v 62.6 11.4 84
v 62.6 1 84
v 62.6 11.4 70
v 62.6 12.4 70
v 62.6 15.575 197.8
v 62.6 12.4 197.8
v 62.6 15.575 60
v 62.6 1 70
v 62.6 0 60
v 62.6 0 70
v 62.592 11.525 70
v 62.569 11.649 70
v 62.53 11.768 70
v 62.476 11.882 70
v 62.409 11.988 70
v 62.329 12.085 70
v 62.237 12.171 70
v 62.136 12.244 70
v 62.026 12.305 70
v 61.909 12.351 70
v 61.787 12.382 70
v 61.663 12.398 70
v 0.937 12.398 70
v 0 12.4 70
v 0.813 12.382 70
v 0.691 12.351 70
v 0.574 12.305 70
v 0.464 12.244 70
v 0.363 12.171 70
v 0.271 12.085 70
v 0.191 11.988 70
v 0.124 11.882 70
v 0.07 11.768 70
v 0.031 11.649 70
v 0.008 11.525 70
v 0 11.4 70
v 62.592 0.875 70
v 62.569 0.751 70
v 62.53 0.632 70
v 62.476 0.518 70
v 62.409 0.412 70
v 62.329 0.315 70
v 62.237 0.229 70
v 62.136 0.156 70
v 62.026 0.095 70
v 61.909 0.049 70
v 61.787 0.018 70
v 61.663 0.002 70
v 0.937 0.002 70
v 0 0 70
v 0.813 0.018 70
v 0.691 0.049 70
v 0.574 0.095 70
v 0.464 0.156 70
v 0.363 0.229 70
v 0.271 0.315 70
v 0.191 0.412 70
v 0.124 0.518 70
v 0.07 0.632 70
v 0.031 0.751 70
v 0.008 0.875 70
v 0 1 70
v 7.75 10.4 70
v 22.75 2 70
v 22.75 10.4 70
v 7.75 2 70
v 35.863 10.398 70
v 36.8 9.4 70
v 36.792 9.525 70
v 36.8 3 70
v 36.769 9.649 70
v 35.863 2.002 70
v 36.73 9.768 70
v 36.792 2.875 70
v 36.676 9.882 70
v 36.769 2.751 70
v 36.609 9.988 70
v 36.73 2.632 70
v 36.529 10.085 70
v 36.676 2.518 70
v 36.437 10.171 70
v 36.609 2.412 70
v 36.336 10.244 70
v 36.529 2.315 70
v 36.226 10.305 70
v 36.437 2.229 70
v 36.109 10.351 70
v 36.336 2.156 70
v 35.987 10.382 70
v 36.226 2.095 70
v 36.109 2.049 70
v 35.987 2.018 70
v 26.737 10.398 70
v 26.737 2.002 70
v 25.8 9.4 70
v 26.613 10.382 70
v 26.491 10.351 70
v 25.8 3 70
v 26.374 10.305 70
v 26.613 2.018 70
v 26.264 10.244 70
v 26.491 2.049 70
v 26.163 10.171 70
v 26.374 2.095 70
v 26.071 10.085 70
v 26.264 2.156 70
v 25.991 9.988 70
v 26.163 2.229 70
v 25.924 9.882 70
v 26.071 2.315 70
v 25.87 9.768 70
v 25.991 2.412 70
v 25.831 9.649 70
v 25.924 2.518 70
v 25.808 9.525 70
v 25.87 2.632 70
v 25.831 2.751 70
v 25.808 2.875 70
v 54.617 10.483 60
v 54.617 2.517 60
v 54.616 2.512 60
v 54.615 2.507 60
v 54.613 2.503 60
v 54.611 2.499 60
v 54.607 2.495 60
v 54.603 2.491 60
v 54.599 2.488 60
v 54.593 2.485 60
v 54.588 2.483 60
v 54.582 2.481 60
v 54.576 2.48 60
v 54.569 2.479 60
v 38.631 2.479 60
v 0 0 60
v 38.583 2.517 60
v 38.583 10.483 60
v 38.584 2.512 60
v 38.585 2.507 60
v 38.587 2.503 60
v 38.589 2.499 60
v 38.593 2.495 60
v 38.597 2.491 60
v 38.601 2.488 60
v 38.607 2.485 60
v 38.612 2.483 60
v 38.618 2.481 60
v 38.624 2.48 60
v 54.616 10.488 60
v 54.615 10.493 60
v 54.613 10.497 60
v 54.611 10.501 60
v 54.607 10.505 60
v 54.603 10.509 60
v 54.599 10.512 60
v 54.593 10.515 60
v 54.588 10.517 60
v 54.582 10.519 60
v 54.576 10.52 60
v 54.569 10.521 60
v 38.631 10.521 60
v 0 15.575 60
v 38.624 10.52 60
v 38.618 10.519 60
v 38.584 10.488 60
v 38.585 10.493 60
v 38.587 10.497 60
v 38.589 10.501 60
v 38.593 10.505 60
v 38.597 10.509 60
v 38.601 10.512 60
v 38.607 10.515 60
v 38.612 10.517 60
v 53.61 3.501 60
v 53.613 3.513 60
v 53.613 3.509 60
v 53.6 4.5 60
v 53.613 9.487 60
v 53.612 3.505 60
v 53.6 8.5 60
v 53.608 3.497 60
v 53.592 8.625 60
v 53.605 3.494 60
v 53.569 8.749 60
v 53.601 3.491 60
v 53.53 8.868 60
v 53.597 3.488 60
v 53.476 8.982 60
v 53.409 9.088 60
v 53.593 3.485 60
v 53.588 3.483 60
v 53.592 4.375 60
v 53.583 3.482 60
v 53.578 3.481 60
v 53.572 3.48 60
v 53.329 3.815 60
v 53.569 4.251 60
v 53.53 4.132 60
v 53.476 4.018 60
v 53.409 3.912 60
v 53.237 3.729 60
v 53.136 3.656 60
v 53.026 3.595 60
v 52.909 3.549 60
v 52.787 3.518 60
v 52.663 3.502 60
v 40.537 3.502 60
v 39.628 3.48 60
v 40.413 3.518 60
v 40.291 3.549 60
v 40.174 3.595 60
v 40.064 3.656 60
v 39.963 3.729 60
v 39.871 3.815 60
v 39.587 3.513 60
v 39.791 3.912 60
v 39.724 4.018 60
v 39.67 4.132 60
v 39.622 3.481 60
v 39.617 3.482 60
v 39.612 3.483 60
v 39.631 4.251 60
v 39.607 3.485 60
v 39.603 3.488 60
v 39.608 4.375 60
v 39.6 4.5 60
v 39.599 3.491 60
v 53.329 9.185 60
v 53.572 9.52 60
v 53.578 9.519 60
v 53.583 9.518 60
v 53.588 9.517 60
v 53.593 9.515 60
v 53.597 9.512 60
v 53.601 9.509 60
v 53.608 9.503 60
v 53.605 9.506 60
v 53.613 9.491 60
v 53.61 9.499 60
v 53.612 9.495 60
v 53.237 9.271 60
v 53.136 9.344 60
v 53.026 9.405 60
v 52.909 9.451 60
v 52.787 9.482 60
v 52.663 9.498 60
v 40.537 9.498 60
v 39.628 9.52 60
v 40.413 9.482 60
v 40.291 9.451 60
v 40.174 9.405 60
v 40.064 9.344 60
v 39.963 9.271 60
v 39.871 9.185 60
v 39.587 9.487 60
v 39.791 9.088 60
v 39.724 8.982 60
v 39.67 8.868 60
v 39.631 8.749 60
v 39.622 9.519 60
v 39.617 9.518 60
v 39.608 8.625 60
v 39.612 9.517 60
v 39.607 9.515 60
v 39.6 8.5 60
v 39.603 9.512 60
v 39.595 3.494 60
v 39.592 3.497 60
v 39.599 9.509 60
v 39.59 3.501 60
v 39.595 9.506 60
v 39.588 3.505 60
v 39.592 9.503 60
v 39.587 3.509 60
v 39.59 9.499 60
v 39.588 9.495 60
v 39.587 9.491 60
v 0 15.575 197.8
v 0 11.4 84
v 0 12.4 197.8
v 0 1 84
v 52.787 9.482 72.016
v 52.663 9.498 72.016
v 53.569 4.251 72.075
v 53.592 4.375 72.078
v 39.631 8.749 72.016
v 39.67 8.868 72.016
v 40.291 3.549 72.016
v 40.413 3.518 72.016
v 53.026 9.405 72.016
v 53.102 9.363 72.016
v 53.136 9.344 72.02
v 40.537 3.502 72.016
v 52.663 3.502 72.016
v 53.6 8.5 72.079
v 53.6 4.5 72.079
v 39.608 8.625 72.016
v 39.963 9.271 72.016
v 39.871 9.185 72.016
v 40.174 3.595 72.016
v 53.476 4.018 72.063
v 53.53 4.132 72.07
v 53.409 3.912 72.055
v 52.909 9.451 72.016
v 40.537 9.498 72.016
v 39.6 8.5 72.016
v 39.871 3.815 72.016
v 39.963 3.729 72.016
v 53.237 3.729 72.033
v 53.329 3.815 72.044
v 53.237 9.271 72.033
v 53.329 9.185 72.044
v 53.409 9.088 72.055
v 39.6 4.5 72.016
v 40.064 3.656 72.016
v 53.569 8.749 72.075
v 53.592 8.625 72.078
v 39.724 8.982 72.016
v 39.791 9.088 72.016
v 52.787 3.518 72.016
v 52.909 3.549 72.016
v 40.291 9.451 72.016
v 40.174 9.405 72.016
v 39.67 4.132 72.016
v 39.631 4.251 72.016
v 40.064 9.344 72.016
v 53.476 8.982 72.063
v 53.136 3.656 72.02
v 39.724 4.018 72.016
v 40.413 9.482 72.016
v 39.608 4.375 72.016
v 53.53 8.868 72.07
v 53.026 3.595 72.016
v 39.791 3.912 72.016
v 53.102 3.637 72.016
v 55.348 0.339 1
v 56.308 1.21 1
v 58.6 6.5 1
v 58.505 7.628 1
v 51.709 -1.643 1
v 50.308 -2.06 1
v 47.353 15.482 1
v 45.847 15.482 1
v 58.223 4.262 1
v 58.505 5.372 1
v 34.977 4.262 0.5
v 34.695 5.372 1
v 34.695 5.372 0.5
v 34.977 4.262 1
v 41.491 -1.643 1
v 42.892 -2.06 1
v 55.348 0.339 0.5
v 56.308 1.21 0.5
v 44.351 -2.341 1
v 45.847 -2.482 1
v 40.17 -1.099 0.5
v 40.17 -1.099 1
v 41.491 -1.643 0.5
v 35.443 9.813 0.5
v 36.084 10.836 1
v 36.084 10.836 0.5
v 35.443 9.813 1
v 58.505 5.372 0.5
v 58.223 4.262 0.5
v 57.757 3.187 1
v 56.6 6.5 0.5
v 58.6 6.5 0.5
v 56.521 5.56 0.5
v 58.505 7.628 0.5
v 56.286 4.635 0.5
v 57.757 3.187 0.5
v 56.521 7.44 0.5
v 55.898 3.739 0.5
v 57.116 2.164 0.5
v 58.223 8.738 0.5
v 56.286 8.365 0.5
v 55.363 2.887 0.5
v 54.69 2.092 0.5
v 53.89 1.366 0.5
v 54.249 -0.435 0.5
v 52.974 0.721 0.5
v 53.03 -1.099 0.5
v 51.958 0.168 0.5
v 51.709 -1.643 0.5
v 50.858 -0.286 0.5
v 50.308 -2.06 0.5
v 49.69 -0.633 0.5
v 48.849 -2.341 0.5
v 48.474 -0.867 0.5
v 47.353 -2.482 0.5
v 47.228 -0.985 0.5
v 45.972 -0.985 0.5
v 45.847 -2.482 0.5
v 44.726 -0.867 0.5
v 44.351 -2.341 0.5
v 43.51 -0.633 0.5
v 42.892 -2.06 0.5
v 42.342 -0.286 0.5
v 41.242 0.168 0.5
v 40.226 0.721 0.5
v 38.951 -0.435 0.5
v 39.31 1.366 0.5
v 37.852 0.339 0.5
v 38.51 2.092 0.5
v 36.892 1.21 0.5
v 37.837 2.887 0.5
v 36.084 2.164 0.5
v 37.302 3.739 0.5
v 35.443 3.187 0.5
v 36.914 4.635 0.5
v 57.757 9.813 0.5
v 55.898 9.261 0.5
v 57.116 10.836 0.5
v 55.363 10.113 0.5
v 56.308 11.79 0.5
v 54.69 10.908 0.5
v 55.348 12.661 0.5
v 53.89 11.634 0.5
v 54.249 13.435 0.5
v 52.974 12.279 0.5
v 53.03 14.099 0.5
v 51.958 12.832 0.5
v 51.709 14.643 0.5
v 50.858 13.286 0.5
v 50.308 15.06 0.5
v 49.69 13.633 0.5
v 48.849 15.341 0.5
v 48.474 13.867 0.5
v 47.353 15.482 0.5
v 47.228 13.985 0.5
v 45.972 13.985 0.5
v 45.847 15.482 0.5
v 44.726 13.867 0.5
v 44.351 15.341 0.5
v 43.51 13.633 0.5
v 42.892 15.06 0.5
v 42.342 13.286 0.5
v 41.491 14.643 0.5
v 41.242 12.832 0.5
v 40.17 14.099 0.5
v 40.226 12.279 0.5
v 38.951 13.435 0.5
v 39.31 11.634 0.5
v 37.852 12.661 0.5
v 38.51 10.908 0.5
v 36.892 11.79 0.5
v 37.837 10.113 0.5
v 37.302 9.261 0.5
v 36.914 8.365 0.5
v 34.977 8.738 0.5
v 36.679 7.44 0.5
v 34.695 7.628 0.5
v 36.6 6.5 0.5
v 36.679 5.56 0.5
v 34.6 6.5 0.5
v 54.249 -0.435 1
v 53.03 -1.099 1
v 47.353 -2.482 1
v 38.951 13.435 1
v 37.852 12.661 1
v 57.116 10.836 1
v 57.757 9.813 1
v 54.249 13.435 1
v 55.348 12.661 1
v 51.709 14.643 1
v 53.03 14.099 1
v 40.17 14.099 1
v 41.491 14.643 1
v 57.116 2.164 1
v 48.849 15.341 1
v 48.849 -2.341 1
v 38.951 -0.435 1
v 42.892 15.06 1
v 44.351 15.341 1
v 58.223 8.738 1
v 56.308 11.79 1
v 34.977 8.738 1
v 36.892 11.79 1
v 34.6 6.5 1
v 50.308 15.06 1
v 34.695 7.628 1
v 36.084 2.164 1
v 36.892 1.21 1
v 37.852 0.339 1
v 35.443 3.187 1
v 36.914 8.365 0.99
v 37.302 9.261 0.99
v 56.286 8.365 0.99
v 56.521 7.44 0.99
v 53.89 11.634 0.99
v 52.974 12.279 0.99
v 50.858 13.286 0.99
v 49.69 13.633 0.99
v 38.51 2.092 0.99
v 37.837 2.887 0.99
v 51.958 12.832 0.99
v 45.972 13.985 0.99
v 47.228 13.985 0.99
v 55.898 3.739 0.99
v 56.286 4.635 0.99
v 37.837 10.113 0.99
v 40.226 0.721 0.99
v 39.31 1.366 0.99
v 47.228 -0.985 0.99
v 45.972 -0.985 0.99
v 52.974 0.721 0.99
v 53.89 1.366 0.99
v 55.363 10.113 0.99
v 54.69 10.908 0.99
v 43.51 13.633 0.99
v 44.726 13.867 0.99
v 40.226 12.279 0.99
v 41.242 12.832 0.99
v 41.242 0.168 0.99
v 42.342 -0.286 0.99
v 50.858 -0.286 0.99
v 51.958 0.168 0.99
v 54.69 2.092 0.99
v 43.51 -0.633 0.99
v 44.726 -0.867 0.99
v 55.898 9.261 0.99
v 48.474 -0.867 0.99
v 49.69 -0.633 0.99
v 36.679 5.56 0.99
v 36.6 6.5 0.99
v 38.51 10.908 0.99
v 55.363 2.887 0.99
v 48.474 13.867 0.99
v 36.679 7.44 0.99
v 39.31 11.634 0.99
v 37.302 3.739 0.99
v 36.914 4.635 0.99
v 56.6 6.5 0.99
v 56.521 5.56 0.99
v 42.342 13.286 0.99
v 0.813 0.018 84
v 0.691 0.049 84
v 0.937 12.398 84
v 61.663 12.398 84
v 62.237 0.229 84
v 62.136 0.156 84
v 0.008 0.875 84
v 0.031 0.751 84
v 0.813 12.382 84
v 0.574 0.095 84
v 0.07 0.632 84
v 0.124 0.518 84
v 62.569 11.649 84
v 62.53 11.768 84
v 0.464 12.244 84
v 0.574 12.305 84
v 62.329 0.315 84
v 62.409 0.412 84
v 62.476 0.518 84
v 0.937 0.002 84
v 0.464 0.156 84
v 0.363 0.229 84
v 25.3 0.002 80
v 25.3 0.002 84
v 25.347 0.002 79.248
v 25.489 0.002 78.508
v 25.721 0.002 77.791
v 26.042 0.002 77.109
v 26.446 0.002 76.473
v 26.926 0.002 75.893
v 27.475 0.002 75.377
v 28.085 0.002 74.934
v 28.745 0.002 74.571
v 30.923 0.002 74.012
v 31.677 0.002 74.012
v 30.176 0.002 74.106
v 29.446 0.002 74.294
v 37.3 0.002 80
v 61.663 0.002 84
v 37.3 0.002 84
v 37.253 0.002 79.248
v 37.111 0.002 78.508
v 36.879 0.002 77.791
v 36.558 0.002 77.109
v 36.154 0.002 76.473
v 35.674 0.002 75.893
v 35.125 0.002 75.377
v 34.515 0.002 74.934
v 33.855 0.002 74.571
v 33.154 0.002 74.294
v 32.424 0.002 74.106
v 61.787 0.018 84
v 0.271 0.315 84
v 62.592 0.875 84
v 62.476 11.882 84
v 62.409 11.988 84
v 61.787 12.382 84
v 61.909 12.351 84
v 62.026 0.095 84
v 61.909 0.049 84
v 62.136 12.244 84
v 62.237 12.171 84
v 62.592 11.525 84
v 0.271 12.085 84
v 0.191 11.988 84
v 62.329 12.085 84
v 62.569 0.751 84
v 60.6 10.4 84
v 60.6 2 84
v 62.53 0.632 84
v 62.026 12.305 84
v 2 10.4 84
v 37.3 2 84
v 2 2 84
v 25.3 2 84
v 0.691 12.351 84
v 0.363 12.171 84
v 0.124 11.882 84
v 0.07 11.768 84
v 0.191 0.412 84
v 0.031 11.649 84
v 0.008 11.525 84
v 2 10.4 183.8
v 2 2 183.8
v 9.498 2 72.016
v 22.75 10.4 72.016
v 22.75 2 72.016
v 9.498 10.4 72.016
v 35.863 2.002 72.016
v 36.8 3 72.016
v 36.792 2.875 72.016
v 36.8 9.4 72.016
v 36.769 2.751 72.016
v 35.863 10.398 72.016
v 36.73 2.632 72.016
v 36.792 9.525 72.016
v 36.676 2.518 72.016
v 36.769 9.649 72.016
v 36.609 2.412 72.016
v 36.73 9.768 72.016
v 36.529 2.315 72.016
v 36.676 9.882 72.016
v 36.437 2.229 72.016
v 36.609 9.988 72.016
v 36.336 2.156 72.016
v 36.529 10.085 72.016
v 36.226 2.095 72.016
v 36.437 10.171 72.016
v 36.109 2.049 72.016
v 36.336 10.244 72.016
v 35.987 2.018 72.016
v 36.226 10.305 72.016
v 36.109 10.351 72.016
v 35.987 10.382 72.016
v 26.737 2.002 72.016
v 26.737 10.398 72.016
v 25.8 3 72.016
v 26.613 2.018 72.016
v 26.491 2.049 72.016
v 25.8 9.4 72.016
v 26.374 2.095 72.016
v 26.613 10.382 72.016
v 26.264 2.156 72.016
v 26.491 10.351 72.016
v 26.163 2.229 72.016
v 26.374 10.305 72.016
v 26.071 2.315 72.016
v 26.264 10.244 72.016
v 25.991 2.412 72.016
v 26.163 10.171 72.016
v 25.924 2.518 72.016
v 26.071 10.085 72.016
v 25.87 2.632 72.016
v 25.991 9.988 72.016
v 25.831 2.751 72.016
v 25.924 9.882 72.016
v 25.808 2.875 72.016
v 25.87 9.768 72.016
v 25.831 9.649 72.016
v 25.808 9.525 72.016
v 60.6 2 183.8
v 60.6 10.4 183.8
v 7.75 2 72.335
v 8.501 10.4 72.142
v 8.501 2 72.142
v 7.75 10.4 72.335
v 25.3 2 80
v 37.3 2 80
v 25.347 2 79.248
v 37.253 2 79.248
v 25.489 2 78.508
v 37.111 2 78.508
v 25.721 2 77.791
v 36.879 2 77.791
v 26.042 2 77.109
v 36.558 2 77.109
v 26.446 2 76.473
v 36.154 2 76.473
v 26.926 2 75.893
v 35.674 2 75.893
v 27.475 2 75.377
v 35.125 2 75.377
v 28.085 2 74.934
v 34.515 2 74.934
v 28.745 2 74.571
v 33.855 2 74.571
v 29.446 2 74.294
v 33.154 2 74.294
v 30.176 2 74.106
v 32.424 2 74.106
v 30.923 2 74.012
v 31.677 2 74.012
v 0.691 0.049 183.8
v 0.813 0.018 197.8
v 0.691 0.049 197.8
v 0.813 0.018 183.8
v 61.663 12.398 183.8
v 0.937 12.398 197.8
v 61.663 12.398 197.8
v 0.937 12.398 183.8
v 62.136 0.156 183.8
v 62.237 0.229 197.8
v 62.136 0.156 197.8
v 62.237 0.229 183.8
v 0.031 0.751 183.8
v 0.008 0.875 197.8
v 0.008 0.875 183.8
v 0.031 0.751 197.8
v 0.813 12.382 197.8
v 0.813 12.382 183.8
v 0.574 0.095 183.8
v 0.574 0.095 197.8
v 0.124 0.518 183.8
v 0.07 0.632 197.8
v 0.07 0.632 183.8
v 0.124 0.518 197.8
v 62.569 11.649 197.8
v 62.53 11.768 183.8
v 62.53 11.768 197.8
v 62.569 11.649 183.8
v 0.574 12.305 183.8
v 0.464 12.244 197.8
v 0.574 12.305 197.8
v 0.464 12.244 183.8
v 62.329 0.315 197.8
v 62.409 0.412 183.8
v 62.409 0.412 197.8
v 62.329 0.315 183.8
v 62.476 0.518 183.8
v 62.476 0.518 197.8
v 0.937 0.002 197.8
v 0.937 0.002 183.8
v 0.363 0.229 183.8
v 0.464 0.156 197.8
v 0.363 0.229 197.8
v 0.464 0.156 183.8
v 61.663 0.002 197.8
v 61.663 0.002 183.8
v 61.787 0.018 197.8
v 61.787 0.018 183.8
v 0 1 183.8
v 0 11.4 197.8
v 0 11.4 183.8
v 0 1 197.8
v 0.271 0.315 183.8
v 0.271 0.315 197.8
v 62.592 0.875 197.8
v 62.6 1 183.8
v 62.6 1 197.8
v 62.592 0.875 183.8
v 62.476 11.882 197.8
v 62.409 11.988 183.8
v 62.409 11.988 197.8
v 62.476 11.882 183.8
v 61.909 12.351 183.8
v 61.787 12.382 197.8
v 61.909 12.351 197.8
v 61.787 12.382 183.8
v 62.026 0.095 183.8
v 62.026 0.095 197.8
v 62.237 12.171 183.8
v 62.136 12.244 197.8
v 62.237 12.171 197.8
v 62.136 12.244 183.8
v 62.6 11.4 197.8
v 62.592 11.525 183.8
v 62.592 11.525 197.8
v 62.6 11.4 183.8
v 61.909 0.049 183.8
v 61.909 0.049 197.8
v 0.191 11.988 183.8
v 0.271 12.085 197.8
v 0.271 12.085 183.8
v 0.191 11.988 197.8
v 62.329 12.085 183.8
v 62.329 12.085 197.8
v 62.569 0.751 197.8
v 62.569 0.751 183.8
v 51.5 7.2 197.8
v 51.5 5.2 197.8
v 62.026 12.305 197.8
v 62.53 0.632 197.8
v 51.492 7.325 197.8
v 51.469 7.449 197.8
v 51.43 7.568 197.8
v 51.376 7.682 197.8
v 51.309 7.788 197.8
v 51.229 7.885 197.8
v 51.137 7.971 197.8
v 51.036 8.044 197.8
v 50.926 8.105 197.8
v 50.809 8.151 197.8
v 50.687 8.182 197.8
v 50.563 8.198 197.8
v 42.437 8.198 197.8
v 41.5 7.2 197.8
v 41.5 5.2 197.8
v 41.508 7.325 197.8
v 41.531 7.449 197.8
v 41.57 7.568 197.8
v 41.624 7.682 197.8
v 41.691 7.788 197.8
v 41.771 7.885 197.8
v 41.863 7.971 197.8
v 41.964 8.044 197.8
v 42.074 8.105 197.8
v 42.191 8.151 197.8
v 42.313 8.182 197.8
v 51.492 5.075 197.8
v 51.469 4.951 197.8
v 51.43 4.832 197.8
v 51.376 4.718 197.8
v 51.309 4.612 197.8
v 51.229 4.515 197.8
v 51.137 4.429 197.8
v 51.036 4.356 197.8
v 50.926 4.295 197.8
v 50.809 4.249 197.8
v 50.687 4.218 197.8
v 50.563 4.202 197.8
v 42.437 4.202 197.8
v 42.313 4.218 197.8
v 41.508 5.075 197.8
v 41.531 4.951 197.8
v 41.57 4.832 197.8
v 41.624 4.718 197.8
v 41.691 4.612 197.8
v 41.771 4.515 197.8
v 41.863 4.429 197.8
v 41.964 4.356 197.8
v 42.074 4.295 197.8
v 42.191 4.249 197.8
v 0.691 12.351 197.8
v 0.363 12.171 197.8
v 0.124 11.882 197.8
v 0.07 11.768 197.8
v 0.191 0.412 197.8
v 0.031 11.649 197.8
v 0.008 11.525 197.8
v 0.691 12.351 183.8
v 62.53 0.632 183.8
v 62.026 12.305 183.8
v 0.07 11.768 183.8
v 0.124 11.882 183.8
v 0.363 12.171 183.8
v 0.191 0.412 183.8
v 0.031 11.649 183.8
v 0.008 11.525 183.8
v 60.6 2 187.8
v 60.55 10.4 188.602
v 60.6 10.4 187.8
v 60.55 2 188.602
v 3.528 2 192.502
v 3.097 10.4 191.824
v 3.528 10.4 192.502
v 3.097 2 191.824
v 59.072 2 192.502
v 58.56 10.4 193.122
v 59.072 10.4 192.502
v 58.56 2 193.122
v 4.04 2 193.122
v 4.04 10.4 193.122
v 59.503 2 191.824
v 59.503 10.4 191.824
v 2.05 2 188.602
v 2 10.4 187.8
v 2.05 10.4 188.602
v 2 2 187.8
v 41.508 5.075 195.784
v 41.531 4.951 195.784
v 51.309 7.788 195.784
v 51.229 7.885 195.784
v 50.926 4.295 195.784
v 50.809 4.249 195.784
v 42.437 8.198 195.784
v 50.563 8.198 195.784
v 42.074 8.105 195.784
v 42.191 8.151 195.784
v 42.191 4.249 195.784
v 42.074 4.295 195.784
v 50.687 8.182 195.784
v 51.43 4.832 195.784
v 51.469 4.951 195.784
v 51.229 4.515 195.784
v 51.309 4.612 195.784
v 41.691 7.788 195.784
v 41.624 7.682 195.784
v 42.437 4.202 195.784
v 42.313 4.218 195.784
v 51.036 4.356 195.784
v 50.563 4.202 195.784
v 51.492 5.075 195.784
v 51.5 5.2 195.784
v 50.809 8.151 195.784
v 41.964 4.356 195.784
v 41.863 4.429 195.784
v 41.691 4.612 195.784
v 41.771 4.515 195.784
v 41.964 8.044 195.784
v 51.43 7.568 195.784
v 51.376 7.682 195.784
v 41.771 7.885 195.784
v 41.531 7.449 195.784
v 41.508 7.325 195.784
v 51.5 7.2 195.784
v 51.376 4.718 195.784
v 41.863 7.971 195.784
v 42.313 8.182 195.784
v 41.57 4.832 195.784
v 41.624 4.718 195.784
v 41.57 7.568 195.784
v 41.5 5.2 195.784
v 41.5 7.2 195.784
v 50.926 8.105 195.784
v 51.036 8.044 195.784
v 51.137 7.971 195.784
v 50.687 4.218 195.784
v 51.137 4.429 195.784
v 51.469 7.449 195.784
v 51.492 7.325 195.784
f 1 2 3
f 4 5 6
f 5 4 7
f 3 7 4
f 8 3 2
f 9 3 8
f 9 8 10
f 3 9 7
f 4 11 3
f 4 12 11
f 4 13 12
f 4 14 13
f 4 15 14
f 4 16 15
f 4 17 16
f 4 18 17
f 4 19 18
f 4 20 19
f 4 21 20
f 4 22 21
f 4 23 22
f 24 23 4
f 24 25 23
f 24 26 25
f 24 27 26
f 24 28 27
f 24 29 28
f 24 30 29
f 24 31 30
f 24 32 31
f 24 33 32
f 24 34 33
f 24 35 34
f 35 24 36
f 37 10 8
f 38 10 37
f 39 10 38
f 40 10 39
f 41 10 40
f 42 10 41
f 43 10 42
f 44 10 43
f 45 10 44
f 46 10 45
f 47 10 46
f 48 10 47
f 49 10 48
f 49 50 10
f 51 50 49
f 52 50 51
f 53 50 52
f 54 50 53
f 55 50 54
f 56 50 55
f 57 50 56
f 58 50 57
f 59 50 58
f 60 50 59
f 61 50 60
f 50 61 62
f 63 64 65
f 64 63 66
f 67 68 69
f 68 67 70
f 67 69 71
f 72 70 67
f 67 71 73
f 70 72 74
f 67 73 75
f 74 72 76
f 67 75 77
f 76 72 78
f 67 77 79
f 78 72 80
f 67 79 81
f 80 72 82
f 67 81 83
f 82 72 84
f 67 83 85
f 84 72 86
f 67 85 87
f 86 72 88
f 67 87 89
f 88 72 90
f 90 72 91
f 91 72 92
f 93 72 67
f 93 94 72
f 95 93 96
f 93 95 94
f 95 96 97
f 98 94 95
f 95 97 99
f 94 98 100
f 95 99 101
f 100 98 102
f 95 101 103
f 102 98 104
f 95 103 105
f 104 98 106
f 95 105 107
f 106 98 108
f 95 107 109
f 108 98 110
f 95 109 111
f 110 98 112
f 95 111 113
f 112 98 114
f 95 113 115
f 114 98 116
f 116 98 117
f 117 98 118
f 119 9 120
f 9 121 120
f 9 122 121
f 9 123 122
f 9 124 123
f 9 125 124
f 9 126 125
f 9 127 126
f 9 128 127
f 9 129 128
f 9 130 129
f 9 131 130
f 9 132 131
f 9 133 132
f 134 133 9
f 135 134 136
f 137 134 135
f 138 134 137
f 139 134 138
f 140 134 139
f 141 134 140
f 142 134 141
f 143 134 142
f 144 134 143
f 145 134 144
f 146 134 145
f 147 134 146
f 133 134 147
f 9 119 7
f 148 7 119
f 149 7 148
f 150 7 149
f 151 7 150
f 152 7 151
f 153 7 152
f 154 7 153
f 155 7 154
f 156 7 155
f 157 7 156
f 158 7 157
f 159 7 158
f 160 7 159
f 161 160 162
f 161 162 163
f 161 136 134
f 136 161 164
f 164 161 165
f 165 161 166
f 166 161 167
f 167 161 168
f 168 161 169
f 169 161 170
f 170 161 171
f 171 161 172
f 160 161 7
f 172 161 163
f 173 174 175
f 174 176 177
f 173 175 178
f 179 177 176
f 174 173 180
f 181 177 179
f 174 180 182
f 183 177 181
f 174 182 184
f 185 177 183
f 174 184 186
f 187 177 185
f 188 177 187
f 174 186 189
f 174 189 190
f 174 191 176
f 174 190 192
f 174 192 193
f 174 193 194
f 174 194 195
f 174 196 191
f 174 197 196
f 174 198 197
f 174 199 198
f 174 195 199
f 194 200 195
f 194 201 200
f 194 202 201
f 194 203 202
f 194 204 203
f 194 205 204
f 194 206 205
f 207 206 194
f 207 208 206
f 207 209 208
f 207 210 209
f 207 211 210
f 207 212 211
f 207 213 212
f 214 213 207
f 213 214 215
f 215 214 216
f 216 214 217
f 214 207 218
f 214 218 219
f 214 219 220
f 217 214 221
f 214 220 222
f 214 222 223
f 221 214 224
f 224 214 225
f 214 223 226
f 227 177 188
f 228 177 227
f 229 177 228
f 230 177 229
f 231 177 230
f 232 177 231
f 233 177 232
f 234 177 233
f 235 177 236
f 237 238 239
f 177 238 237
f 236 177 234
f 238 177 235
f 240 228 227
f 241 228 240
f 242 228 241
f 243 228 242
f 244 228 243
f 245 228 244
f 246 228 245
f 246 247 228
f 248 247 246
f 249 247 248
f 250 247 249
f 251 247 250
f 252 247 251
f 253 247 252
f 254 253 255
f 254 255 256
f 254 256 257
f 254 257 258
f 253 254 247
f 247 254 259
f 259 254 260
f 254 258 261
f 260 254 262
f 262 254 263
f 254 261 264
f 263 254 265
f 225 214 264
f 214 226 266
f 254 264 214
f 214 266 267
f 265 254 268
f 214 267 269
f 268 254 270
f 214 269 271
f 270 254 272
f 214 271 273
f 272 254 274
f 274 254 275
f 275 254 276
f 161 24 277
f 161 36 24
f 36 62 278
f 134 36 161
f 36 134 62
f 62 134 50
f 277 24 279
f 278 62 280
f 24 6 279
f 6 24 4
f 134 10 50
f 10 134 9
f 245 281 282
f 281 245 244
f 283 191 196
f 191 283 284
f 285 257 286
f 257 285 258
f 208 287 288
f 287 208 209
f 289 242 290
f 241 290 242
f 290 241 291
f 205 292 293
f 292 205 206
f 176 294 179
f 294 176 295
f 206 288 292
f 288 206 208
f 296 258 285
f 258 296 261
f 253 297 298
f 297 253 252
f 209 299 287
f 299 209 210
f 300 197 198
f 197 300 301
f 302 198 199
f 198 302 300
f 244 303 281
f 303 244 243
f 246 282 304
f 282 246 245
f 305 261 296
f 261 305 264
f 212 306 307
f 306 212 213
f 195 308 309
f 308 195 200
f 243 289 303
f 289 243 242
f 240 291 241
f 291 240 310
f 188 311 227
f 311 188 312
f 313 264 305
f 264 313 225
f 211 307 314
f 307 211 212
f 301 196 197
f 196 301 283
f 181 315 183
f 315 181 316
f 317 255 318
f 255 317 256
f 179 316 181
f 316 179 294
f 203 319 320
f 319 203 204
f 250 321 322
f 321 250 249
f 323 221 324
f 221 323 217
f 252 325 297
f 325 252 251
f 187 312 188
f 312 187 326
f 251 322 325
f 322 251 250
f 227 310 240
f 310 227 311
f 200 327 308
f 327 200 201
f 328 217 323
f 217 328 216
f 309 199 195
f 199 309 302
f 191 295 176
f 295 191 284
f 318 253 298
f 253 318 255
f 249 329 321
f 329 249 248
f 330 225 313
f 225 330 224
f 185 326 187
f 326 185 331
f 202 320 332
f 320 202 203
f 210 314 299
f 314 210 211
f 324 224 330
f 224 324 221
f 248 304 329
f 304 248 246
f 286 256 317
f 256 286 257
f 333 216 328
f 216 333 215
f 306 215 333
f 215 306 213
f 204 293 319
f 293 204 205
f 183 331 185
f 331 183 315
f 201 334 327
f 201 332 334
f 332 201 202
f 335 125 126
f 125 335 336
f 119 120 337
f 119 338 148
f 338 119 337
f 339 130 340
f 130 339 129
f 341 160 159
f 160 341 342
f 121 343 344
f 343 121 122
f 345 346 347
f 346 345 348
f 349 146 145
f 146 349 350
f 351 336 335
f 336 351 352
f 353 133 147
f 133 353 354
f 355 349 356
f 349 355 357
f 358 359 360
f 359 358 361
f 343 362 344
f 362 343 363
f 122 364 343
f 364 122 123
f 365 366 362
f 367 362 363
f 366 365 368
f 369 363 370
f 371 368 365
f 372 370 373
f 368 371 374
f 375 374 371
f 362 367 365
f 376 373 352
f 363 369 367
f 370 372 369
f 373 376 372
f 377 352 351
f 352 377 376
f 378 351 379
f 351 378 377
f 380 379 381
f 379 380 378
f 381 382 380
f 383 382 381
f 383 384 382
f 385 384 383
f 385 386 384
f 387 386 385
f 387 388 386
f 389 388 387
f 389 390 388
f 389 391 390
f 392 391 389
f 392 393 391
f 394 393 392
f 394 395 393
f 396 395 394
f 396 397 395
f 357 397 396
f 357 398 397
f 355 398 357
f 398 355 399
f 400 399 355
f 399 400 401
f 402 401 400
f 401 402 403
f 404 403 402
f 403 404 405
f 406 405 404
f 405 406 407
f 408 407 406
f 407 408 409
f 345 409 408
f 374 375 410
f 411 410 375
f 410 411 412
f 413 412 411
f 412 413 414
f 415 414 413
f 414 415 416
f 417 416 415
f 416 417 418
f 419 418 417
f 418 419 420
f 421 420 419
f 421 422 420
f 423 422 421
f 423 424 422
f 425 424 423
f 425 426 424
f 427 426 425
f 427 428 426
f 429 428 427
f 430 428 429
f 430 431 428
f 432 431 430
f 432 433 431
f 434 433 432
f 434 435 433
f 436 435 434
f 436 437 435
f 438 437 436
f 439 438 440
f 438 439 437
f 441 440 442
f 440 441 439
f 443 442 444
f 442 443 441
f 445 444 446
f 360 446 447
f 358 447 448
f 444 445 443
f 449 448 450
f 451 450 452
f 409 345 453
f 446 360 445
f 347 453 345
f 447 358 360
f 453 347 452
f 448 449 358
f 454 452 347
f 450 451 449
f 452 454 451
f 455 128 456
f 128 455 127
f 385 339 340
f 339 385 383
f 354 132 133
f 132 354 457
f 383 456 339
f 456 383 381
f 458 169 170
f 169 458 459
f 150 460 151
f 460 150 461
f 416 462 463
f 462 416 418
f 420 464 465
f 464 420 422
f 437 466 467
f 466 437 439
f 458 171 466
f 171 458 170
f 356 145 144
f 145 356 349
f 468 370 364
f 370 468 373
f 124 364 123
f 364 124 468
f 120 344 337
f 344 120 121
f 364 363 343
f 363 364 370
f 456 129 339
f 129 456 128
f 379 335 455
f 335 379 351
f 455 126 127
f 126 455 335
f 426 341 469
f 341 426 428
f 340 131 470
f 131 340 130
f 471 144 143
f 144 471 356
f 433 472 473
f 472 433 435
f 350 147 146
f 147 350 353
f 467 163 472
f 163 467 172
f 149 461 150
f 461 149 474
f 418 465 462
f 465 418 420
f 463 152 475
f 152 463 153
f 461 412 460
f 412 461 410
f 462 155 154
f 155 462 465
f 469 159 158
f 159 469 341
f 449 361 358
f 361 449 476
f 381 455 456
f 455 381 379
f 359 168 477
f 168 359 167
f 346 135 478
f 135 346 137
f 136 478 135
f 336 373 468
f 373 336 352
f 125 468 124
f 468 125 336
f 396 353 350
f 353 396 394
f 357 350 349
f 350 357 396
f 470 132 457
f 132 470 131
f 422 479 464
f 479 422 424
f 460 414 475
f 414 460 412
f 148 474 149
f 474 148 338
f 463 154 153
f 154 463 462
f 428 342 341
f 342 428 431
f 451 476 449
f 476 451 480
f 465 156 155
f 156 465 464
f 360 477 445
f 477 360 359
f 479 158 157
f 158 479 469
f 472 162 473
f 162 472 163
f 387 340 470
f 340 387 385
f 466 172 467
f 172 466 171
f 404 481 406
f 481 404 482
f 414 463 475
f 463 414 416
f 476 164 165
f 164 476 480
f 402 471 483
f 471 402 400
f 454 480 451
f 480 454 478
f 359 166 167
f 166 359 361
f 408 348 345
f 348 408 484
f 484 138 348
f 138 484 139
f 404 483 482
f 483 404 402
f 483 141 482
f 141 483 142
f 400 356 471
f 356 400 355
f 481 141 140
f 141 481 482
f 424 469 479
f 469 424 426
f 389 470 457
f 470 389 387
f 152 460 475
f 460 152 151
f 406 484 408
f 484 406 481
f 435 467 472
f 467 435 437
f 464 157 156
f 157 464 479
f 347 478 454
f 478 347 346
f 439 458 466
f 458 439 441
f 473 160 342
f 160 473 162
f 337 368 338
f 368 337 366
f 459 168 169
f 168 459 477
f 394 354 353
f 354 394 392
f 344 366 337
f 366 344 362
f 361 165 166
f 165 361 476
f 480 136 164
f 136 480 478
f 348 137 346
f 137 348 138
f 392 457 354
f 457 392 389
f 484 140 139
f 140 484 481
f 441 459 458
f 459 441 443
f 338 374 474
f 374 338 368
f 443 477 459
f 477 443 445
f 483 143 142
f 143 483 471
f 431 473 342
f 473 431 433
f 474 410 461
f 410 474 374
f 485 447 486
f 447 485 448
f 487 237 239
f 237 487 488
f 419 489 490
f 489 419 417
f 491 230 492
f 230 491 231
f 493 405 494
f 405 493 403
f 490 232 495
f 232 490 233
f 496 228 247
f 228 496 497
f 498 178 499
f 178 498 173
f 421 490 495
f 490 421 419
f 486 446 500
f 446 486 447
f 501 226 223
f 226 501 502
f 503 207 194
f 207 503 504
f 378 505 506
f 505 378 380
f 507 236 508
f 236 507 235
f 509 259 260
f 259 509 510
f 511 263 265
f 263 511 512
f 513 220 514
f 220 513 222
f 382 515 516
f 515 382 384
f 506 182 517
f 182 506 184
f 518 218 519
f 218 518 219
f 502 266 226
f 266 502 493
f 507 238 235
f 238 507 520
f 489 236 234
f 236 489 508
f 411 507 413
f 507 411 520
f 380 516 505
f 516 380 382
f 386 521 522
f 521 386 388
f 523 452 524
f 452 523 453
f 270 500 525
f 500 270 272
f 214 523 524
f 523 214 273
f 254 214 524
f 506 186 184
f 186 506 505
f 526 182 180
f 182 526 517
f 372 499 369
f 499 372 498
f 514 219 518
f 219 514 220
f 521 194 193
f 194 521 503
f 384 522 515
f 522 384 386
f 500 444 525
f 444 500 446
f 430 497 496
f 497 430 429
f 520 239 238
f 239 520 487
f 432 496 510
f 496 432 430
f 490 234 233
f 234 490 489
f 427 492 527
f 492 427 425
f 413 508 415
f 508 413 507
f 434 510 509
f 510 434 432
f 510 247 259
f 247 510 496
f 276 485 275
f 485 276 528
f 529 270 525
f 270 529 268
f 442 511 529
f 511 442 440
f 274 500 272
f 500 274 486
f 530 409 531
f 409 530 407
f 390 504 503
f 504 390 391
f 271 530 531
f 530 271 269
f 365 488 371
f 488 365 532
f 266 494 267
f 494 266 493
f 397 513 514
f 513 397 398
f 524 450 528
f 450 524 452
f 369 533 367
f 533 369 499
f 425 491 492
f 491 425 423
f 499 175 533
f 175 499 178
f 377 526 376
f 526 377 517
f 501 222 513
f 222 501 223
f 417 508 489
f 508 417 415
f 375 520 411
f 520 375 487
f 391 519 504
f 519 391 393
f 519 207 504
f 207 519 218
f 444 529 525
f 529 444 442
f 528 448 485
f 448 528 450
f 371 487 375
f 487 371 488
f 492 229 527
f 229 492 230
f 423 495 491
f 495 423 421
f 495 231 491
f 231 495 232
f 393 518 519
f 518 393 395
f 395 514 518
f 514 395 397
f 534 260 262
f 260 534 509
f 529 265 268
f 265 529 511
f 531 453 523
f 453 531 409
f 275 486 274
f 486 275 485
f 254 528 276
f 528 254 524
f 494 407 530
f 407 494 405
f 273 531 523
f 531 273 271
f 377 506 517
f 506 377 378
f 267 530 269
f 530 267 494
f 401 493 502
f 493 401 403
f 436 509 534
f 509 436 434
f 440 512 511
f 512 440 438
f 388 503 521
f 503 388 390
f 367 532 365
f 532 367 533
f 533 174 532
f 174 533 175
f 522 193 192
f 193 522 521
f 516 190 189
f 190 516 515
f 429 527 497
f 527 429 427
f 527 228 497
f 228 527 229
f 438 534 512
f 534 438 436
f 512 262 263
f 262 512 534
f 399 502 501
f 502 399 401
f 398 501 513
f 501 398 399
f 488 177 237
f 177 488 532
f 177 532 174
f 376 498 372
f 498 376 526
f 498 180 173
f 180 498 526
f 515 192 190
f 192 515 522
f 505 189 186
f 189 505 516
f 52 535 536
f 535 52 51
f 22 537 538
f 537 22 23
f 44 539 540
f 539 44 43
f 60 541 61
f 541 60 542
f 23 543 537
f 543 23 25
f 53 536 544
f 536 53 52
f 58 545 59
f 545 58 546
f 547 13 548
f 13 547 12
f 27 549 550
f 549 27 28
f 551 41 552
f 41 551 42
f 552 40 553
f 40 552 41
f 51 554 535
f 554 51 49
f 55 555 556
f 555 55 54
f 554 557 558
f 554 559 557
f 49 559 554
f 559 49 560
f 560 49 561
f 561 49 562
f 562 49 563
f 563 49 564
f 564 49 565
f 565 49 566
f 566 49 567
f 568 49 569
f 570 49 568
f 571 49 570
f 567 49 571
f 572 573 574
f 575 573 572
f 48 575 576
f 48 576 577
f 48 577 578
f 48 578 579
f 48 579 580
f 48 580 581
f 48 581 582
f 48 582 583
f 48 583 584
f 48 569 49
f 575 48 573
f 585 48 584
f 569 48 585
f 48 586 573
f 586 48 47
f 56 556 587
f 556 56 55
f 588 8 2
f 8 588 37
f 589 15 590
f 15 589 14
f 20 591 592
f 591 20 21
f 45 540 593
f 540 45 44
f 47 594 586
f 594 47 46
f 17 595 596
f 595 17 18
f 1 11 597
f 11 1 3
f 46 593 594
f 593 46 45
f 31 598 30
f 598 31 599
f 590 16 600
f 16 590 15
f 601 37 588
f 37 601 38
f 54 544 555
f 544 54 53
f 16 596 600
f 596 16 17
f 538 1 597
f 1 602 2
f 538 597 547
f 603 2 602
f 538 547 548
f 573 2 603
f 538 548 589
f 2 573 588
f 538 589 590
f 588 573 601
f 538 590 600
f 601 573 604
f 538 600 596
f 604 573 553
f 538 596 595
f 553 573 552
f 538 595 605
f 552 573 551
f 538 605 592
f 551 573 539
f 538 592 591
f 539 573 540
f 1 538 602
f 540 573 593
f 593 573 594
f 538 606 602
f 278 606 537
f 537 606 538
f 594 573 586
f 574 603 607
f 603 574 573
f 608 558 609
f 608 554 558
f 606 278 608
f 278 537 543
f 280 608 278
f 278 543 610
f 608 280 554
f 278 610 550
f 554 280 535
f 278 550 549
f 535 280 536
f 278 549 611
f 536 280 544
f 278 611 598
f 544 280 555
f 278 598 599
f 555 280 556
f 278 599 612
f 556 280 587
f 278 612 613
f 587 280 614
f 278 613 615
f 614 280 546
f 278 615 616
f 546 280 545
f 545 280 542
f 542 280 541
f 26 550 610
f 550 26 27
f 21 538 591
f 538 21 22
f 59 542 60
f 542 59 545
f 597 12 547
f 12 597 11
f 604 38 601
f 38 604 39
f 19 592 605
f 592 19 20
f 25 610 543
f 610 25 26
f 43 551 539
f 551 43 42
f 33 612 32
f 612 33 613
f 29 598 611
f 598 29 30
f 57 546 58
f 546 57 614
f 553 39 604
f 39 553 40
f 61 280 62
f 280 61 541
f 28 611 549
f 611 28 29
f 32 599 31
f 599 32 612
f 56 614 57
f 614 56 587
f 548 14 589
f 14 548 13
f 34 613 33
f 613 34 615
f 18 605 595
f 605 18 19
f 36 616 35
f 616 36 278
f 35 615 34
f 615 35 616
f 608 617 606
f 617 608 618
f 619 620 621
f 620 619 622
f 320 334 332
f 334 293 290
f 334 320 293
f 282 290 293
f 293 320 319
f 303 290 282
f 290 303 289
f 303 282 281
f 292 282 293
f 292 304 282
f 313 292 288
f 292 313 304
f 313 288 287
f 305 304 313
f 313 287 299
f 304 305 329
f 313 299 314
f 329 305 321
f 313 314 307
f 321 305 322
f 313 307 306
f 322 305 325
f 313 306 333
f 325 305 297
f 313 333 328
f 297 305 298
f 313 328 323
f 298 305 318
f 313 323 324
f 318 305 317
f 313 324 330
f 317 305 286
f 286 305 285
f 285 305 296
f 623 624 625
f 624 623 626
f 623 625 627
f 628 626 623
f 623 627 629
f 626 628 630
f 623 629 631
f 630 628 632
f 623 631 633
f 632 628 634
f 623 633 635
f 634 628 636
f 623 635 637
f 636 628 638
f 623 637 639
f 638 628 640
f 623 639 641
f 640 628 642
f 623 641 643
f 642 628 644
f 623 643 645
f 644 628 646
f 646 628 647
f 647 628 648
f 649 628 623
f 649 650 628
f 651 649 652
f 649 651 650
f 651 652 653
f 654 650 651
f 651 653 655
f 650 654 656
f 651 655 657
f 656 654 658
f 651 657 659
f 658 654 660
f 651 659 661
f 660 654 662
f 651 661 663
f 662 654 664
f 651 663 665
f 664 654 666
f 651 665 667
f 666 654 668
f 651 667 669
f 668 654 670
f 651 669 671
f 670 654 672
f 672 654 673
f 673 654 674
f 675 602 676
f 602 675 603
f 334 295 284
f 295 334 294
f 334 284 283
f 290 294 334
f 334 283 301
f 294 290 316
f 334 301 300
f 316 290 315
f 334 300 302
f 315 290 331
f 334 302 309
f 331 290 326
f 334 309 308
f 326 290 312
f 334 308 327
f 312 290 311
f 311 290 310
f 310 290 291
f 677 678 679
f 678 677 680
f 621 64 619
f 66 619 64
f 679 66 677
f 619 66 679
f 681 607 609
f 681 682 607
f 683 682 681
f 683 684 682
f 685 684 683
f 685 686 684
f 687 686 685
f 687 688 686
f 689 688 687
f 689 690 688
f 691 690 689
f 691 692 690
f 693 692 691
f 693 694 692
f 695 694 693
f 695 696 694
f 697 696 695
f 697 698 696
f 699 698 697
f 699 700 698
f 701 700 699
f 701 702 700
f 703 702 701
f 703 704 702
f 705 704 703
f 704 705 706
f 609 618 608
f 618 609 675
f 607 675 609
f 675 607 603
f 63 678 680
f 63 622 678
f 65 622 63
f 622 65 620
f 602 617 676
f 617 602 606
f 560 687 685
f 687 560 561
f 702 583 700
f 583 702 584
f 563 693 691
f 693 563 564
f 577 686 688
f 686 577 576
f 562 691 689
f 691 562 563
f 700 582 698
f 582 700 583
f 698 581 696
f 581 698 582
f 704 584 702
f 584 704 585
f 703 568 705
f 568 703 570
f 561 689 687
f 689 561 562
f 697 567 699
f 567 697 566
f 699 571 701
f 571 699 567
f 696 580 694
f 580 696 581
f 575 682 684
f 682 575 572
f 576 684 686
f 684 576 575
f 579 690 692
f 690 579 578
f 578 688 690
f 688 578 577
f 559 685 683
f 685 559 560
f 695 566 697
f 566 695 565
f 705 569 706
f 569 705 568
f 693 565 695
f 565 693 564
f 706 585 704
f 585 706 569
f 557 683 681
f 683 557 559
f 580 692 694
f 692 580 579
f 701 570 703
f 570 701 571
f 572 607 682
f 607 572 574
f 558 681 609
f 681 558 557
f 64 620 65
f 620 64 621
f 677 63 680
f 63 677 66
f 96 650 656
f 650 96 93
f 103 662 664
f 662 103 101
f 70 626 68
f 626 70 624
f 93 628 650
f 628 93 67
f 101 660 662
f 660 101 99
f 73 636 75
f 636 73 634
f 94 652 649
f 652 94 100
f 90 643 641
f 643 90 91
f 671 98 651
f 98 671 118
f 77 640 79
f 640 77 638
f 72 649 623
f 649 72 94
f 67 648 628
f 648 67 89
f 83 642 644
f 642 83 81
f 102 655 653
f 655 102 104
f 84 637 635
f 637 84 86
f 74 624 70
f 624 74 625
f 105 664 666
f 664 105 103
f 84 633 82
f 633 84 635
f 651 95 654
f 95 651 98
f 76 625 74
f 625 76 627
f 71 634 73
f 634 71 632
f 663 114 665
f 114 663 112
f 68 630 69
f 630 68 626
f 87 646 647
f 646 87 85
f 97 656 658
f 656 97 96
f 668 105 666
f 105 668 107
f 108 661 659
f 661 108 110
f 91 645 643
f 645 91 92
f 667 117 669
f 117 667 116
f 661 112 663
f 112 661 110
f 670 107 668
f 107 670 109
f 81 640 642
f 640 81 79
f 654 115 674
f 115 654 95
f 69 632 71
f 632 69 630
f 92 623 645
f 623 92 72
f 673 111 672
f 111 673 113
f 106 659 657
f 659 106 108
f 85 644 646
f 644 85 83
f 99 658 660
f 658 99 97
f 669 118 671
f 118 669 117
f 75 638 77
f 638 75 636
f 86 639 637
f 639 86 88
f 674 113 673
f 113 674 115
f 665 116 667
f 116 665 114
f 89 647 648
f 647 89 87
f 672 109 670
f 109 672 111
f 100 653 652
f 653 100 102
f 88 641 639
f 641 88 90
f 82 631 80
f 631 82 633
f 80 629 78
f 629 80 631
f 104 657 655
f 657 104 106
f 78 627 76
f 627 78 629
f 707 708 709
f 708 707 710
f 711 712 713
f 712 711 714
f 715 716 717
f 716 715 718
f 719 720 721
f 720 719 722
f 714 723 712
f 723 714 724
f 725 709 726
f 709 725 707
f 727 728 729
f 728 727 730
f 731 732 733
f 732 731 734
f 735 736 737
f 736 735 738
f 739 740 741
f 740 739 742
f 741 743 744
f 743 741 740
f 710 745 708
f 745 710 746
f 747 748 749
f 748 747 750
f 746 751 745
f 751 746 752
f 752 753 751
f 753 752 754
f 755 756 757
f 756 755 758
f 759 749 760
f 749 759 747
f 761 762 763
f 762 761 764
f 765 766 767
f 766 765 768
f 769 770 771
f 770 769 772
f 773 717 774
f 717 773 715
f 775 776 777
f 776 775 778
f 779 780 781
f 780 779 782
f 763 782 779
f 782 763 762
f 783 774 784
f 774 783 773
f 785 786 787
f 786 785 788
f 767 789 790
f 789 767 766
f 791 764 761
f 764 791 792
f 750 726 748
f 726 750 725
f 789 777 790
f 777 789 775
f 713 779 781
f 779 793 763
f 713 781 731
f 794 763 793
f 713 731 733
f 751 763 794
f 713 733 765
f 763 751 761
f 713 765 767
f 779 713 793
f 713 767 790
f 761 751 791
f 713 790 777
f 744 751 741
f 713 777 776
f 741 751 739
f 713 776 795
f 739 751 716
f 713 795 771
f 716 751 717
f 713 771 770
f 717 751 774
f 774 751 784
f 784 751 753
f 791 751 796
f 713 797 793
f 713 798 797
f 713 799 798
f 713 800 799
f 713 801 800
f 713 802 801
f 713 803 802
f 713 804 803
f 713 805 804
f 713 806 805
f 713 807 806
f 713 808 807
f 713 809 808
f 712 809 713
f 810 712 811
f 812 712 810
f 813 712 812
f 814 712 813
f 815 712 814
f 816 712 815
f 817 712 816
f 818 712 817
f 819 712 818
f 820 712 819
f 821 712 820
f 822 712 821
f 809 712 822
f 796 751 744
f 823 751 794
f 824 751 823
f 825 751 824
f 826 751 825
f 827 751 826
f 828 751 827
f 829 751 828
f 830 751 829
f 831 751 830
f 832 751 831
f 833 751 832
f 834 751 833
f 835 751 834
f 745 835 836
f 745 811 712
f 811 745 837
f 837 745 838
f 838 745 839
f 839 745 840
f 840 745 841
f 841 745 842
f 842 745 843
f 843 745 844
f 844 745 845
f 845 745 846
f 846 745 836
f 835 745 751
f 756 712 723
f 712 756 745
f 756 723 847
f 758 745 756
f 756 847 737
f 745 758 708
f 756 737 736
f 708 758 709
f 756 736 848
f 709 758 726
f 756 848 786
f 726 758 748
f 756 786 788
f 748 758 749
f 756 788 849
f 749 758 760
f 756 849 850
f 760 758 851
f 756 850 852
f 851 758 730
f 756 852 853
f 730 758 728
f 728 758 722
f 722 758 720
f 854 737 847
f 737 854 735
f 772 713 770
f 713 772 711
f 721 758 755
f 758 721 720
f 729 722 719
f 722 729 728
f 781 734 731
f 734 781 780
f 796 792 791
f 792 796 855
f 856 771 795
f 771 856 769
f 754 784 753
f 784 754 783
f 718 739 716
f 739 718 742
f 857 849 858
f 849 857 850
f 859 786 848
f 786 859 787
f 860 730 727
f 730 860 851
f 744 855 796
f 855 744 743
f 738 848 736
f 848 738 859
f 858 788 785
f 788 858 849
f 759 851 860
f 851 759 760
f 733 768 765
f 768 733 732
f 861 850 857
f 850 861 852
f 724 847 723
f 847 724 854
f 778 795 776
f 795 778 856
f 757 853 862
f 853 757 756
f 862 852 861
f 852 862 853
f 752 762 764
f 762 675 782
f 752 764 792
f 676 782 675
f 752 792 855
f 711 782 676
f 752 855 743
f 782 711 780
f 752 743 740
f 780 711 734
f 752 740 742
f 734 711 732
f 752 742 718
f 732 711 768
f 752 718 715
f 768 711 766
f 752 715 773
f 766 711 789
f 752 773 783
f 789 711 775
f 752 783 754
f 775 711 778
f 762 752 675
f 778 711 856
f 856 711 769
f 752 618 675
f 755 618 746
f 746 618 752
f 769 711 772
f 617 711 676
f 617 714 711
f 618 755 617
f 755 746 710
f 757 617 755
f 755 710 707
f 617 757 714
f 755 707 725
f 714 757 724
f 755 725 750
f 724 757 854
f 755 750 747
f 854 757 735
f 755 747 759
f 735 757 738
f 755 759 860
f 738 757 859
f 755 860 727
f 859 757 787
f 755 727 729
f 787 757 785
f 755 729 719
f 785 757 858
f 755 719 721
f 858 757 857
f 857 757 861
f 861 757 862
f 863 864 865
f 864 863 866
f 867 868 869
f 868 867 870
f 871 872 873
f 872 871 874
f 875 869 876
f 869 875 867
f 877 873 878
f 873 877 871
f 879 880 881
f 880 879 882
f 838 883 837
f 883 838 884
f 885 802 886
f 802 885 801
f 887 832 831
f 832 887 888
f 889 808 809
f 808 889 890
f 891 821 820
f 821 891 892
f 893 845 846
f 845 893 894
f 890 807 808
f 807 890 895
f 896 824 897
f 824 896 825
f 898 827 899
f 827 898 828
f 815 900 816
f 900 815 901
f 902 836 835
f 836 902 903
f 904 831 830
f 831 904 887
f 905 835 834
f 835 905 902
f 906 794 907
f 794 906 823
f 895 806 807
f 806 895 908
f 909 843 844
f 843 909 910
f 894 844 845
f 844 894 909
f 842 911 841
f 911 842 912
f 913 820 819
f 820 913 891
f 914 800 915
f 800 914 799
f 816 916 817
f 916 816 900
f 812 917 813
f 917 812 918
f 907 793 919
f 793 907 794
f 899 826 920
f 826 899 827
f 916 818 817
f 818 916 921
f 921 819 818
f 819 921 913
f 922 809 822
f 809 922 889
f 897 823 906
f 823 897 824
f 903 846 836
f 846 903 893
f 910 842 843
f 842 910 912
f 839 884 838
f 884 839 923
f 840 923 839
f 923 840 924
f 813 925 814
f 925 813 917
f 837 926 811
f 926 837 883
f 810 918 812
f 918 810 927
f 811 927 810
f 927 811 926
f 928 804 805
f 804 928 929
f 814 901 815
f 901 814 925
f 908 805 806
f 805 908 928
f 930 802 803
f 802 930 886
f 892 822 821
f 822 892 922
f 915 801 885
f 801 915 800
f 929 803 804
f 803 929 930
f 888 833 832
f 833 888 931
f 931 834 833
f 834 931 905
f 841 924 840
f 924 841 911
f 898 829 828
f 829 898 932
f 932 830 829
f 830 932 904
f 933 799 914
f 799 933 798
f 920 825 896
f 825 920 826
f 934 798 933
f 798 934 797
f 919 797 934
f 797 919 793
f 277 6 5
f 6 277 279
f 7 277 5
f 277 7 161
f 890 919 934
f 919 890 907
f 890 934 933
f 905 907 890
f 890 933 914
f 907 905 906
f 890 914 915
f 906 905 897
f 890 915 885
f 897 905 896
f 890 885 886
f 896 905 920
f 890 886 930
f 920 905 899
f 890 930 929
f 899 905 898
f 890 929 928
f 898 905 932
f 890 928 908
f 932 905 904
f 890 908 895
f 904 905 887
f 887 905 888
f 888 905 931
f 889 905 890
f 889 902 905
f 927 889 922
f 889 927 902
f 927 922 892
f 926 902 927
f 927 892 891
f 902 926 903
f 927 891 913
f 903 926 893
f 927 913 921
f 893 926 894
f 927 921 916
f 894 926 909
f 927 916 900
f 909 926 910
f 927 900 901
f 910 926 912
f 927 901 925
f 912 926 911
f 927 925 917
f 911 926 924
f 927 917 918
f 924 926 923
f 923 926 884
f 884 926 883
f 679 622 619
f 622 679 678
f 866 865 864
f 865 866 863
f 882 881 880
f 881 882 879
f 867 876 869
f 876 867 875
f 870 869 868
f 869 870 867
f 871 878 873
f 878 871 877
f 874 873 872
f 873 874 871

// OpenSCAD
// file: ../lib/basics.scad
// ## `basics.scad`
// This library contains basic elements to construct mobile device augmentations.

// ### `roundedCube(dimension,edgeRadius)`
// A cube with rounded edges on the depth axis. This function is helpful for creating simple phone shapes.
// #### Where
// * `dimension=[width,depth,height]`: the size of the cube
// * `edgeRadius`: the radius of the rounded edges 
module roundedCube(dimension=[10,10,10],edgeRadius=1){
    translate([0,dimension[1],0])
		rotate([90,0,0])
			hull(){
        		translate([edgeRadius,edgeRadius,0])
					cylinder(r=edgeRadius,h=dimension[1]);
        		translate([dimension[0]-edgeRadius,edgeRadius,0])
					cylinder(r=edgeRadius,h=dimension[1]);
        		translate([edgeRadius,dimension[2]-edgeRadius,0])
					cylinder(r=edgeRadius,h=dimension[1]);
        		translate([dimension[0]-edgeRadius,dimension[2]-edgeRadius,0])
					cylinder(r=edgeRadius,h=dimension[1]);
    		}
}

// ### `bottomHolder(deviceWidth,deviceDepth,deviceEdgeRadius,deviceHeightInHolder,wallThickness,holderEdgeRadius)`
// A basic generic element to hold the bottom part of a device
// #### Where
// * `deviceWidth`: the width of the device to be held
// * `deviceDepth`: the depth of the device to be held
// * `deviceEdgeRadius`: the edge radius of the device to be held
// * `deviceHeightInHolder`: the height of the part of the holder covering the device
// * `wallThickness`: the holder's wall thickness
// * `holderEdgeRadius`: the holder's edge radius
module bottomHolder(deviceWidth=10,deviceDepth=10,deviceEdgeRadius=1,
deviceHeightInHolder=10,wallThickness=1,holderEdgeRadius=1){
	difference(){
		translate([0,deviceDepth+wallThickness*2,0])
			rotate([90,0,0])
				roundedCube([deviceWidth+wallThickness*2,deviceHeightInHolder+wallThickness,
				deviceDepth+wallThickness*2],holderEdgeRadius);
		translate([wallThickness,wallThickness,wallThickness])
			roundedCube([deviceWidth,deviceDepth,
			deviceHeightInHolder+deviceEdgeRadius],deviceEdgeRadius);
	}
}

// ### `topHolder(deviceWidth,deviceDepth,deviceEdgeRadius,deviceHeightInHolder,wallThickness,lipsWidth,holderEdgeRadius)`
// A basic generic element to hold the top part of a device
// #### Where
// * `deviceWidth`: the width of the device to be held
// * `deviceDepth`: the depth of the device to be held
// * `deviceEdgeRadius`: the edge radius of the device to be held
// * `deviceHeightInHolder`: the height of the part of the holder covering the device
// * `wallThickness`: the holder's wall thickness
// * `lipsWidth`: size of the lips holding the device
// * `holderEdgeRadius`: the holder's edge radius
module topHolder(deviceWidth=10,deviceDepth=10,deviceEdgeRadius=1,deviceHeightInHolder=10,
wallThickness=1,lipsWidth=2,holderEdgeRadius=1){
	difference(){
		translate([0,deviceDepth+wallThickness*2,0])rotate([90,0,0])
			roundedCube([deviceWidth+wallThickness*2,deviceHeightInHolder+wallThickness,
			deviceDepth+wallThickness*2],holderEdgeRadius);
		translate([wallThickness,wallThickness,-wallThickness*2])
			roundedCube([deviceWidth,deviceDepth,deviceHeightInHolder],deviceEdgeRadius);
		//translate([wallThickness+lipsWidth,-0.01,-wallThickness-lipsWidth-0.85]) // TODO: 0.85 wrong here: needs to be fixed
		//	roundedCube([deviceWidth-lipsWidth*2,wallThickness+0.02,deviceHeightInHolder],
	//		deviceEdgeRadius*((deviceWidth-lipsWidth*2)/deviceWidth));
	}
}

// ### `rectangleCircularHorn(rectangleWidth,rectangleHeight,circleRadius,hornLength,wallThickness,hornDeformationFactor,hornDerivation,endsHeight)`
// A horn with a square termination on one side and a circle termination on the other.
// #### Where
// * `rectangleWidth`: the width of the rectangular termination
// * `rectangleHeight`: the height of the rectangular termination
// * `circleRadius`: the radius of the circular termination
// * `hornLength`: the length of the horn
// * `wallThickness`: the thickness of the walls
// * `hornDeformationFactor`: controls the vertical flatness of the horn with (1=perfect circle, >1=flatened circle) 
// * `hornDerivation`: displace the position of the circular end relatively to the rectangular end on the horizontal axis
// * `endsHeight`: the height of the two ends
module rectangleCircularHorn(rectangleWidth=10,rectangleHeight=10,circleRadius=10,hornLength=10,wallThickness=1,
hornDeformationFactor=1,hornDerivation=0,endsHeight=0.5){
	difference(){
		hull(){
			cube([rectangleWidth+wallThickness,rectangleHeight+wallThickness,endsHeight],center=true);
			translate([hornDerivation,0,hornLength-endsHeight*2])
				scale([1,hornDeformationFactor,1])
					cylinder(r=circleRadius+wallThickness,h=endsHeight);
		}
		hull(){
			translate([0,0,-0.01])
				cube([rectangleWidth,rectangleHeight,endsHeight],center=true);
			translate([hornDerivation,0,hornLength-endsHeight*2+0.01])
				scale([1,hornDeformationFactor,1])
					cylinder(r=circleRadius,h=endsHeight);
		}
	}
}

// ### `halfSphere(radius)`
// A half sphere useful to create tops.
// #### Where
// * `radius`: the radius of the half sphere
module halfSphere(radius=10){
	difference(){
		translate([radius,radius,0])sphere(radius);
		translate([0,0,-radius*2])cube([radius*2,radius*2,radius*2]);
	}
}

// ### `halfCylinder(dimension=[10,10,10])`
// A half cylinder with controllable height.
// #### Where
// * `dimension=[width,depth,height]`: the size of the half cylinder
module halfCylinder(dimension=[10,10,10]){
	rotate([-90,0,0])scale([1,dimension[2]/dimension[0],1])difference(){
		translate([dimension[0]/2,0,0.01])cylinder(r=dimension[0]/2,h=dimension[1]);
		cube([dimension[0],dimension[0],dimension[1]+0.02]);
	}
}
// main file
include <../lib/iPhone5.scad>

$fn=50;

iPhone5_CaseWithSpeakerMouthPipe();
translate([iPhone5_Module_WallThickness,iPhone5_Module_WallThickness,iPhone5_Module_WallThickness+iPhone5_SpeakerMouthPipe_HornLength+iPhone5_SpeakerMouthPipe_BaseThickness])iPhone5();
